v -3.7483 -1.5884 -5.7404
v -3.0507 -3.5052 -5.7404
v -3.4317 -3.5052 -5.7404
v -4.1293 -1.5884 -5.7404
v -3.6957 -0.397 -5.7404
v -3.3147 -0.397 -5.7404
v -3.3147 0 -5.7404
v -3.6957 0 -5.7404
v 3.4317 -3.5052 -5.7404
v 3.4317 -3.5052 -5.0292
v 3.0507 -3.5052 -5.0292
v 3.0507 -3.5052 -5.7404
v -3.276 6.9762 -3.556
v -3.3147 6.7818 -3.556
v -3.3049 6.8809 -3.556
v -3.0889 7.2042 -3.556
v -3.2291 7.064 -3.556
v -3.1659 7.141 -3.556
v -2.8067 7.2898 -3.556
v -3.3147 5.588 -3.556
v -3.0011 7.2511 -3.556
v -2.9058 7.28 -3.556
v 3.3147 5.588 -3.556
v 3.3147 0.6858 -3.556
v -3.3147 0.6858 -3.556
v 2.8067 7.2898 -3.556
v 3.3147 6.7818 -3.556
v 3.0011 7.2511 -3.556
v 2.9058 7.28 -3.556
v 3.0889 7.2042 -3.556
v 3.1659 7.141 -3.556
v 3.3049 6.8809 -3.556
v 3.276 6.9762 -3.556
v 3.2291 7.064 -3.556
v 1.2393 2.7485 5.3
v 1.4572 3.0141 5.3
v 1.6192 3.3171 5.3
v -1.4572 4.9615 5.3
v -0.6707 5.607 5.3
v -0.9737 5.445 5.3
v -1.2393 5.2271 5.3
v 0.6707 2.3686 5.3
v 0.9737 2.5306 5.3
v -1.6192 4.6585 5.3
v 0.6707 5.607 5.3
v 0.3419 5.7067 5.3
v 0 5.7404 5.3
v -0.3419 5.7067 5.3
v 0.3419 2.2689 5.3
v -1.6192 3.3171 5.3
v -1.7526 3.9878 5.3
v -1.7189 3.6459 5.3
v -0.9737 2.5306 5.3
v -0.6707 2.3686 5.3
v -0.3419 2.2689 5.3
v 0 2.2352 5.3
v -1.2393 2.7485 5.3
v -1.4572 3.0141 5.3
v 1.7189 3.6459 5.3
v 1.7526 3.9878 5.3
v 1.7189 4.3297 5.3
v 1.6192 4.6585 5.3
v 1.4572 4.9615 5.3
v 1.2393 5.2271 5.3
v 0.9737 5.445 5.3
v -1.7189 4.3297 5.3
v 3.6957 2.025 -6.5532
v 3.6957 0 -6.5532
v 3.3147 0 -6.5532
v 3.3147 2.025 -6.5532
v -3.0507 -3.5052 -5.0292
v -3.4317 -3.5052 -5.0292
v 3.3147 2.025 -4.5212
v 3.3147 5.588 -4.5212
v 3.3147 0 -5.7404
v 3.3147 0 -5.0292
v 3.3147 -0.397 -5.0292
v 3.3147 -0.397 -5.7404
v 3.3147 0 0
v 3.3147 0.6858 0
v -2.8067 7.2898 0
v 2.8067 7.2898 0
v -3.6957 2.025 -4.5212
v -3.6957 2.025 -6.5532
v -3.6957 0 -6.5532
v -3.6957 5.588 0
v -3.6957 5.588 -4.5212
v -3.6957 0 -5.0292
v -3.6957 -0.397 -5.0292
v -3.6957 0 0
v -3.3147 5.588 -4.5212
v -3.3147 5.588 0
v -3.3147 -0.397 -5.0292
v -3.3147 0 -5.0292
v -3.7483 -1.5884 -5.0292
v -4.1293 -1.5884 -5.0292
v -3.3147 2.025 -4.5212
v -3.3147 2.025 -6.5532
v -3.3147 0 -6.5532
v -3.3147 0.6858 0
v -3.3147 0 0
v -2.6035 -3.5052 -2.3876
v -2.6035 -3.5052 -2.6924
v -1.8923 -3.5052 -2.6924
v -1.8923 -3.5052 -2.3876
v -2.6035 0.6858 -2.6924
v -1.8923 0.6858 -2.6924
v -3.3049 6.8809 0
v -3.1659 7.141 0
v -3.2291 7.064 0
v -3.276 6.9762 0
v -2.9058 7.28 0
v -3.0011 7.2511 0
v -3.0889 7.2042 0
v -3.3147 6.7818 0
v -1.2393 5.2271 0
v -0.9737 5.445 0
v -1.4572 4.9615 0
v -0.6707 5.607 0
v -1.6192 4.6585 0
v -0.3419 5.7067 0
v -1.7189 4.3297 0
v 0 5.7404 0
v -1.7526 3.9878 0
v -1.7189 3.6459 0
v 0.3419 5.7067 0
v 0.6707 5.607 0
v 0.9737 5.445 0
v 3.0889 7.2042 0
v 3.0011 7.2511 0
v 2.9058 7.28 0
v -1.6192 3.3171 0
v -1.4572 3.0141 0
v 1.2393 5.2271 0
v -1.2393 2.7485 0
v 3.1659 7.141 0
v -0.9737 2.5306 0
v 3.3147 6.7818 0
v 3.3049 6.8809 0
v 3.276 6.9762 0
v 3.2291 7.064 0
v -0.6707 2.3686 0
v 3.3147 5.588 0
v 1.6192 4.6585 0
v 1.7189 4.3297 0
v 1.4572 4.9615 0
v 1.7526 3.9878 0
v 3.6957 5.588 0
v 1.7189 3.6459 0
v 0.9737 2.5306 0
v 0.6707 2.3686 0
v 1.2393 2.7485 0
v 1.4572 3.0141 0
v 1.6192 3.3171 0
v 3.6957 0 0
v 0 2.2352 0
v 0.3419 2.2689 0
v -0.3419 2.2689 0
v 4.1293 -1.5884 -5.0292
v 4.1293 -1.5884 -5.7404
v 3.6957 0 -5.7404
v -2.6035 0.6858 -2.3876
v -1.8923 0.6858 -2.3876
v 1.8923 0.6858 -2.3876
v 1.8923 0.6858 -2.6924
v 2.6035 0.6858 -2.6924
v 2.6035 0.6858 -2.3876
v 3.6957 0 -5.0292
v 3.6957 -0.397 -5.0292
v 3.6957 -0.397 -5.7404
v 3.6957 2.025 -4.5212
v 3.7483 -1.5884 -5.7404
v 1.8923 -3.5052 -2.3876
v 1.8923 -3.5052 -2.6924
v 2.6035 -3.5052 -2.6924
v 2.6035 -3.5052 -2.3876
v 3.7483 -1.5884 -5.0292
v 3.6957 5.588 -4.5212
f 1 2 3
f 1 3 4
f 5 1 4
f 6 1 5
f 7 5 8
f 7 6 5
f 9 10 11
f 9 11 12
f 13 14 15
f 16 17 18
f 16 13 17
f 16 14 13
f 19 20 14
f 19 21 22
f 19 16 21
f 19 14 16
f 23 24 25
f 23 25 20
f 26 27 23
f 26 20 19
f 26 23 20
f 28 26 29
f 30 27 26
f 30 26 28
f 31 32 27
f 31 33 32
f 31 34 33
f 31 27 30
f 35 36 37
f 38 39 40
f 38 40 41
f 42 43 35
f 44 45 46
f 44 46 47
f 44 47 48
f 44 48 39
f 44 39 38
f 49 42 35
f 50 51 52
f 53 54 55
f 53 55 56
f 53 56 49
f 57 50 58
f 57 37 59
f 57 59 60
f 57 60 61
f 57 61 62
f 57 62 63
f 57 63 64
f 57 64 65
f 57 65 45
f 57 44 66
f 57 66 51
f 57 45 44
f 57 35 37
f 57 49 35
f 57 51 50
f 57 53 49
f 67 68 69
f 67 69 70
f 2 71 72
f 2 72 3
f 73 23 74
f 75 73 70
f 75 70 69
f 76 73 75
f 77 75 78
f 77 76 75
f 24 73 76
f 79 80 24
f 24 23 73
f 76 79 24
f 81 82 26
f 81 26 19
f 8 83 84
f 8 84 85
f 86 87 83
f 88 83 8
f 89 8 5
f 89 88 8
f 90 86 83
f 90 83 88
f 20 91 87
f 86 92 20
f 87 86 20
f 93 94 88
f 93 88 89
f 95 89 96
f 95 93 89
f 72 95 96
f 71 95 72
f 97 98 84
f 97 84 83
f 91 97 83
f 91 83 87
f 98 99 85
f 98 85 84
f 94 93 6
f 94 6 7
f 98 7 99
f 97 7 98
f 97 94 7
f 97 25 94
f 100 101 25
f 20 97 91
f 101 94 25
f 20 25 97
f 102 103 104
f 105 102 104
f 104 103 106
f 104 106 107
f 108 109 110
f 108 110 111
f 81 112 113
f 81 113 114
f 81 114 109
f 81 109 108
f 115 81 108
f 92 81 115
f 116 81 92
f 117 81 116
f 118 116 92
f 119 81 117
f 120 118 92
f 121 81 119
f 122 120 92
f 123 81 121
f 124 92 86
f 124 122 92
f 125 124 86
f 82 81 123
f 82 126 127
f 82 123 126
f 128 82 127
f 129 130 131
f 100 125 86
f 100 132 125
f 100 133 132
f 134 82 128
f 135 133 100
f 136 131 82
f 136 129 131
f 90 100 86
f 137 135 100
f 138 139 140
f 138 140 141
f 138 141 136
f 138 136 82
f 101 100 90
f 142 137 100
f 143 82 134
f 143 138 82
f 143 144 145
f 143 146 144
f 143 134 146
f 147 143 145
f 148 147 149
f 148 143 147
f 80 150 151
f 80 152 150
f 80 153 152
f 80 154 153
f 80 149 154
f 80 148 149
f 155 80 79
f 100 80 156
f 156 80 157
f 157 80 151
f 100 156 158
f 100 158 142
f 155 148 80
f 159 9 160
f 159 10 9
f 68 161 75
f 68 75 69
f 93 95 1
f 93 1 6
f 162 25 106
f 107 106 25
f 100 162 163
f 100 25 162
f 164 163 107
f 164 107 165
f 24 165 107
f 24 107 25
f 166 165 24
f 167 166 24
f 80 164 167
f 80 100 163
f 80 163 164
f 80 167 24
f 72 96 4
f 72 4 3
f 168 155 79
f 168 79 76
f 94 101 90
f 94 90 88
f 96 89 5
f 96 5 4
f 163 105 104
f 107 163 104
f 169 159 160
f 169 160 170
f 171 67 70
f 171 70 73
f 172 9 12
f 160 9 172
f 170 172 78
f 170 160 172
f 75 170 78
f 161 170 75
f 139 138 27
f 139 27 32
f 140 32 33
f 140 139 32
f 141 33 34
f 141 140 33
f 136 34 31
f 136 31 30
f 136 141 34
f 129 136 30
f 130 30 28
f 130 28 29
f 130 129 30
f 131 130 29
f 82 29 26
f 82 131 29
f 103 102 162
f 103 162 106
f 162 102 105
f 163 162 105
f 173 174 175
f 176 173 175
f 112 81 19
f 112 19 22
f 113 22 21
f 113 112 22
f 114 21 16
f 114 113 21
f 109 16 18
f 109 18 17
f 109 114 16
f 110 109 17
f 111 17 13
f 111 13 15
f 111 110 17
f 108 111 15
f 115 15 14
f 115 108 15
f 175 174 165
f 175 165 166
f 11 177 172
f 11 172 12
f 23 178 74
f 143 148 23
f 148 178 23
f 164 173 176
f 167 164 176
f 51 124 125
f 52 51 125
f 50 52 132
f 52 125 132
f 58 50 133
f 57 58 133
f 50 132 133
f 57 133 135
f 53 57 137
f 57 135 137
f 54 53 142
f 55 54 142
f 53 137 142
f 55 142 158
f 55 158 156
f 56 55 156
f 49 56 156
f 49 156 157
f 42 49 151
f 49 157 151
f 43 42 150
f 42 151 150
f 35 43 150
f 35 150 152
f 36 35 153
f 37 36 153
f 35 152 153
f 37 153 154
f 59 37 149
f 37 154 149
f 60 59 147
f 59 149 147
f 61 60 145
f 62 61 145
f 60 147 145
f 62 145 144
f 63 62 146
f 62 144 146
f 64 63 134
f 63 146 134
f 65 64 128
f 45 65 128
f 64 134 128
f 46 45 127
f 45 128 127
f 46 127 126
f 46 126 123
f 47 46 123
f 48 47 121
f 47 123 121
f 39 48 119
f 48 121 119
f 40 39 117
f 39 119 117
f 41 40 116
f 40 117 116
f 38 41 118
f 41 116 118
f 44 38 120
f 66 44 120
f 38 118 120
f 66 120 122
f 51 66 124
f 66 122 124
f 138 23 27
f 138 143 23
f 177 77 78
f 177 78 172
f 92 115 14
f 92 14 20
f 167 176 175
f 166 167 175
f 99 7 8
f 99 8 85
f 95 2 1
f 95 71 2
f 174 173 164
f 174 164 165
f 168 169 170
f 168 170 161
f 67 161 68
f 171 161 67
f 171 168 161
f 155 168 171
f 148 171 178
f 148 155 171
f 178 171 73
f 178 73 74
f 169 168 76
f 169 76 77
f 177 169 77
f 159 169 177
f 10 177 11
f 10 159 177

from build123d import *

# Parameters (mm, degrees)
EXTRUDE2_DEPTH      = 6.35
SKETCH3_OUTSIDE_W   = 18.322
SKETCH3_OUTSIDE_H   = 16.747
CUT_EXTRUDE1_DEPTH  = 7.62
SKETCH4_W           = 6.6294
SKETCH4_H           = 5.959117839
CUT_EXTRUDE2_DEPTH  = 12.7
EXTRUDE3_DEPTH      = 2.54
EXTRUDE3_DEPTH_BACK = 3.5052
SKETCH5_W           = 0.7112
SKETCH5_H           = 0.3048
SKETCH6_R           = 1.7526
EXTRUDE4_DEPTH      = 5.3


with BuildPart() as part:
    # Sketch2 → Extrude2 (new, symmetric)
    with BuildSketch(Plane(origin=(0, 0, 0), x_dir=(0, 0, -1), z_dir=(1, 0, 0))):
        Polygon((0, 0), (5.0292, 0), (5.0292, -3.5052), (5.7404, -3.5052), (5.7404, 0), (6.5532, 0), (6.5532, 2.025013386), (4.5212, 2.025013386), (4.5212, 5.588), (3.556, 5.588), (3.556, 7.62), (0, 7.62), align=None)
    extrude(amount=EXTRUDE2_DEPTH, both=True)

    # Sketch3 outside → Cut-Extrude1 (cut, symmetric)
    with BuildSketch(Plane.XY):
        with Locations((0, 2.0575)):
            Rectangle(SKETCH3_OUTSIDE_W, SKETCH3_OUTSIDE_H)
        with BuildLine():
            Line((-3.3147, 0.6858), (3.3147, 0.6858))
            Line((3.3147, 0.6858), (3.3147, -0.396973009))
            Line((3.3147, -0.396973009), (3.748326519, -1.588352079))
            Line((3.748326519, -1.588352079), (2.978268534, -3.704069007))
            Line((2.978268534, -3.704069007), (3.3147, -3.826520046))
            Line((3.3147, -3.826520046), (4.129326519, -1.588352079))
            Line((4.129326519, -1.588352079), (3.6957, -0.396973009))
            Line((3.6957, -0.396973009), (3.6957, 5.588))
            Line((3.6957, 5.588), (3.3147, 5.588))
            Line((3.3147, 5.588), (3.3147, 6.7818))
            ThreePointArc((3.3147, 6.7818), (3.165910245, 7.141010245), (2.8067, 7.2898))
            Line((2.8067, 7.2898), (-2.8067, 7.2898))
            ThreePointArc((-2.8067, 7.2898), (-3.165910245, 7.141010245), (-3.3147, 6.7818))
            Line((-3.3147, 6.7818), (-3.3147, 5.588))
            Line((-3.3147, 5.588), (-3.6957, 5.588))
            Line((-3.6957, 5.588), (-3.6957, -0.396973009))
            Line((-3.6957, -0.396973009), (-4.129326519, -1.588352079))
            Line((-4.129326519, -1.588352079), (-3.3147, -3.826520046))
            Line((-3.3147, -3.826520046), (-2.978268534, -3.704069007))
            Line((-2.978268534, -3.704069007), (-3.748326519, -1.588352079))
            Line((-3.748326519, -1.588352079), (-3.3147, -0.396973009))
            Line((-3.3147, -0.396973009), (-3.3147, 0.6858))
        make_face(mode=Mode.SUBTRACT)
    extrude(amount=CUT_EXTRUDE1_DEPTH, both=True, mode=Mode.SUBTRACT)

    # Sketch4 → Cut-Extrude2 (cut)
    with BuildSketch(Plane(origin=(0, 0, 0), x_dir=(1, 0, 0), z_dir=(0, 1, 0))):
        with Locations((0, 6.535558919)):
            Rectangle(SKETCH4_W, SKETCH4_H)
    extrude(amount=CUT_EXTRUDE2_DEPTH, mode=Mode.SUBTRACT)

    # Sketch5 → Extrude3 (add, two sides: drawn at the far end of the back side and taken through both)
    with BuildSketch(Plane(origin=(0, 0, 0), x_dir=(1, 0, 0), z_dir=(0, 1, 0)).offset(-EXTRUDE3_DEPTH_BACK)):
        with Locations((2.2479, 2.54)):
            Rectangle(SKETCH5_W, SKETCH5_H)
        with Locations((-2.2479, 2.54)):
            Rectangle(SKETCH5_W, SKETCH5_H)
    extrude(amount=EXTRUDE3_DEPTH + EXTRUDE3_DEPTH_BACK)

    # Sketch6 → Extrude4 (add)
    with BuildSketch(Plane.XY):
        with Locations(Location((0, 3.9878, 0), (0, 0, 180))):
            Circle(SKETCH6_R)
    extrude(amount=EXTRUDE4_DEPTH)


solid = part.part
